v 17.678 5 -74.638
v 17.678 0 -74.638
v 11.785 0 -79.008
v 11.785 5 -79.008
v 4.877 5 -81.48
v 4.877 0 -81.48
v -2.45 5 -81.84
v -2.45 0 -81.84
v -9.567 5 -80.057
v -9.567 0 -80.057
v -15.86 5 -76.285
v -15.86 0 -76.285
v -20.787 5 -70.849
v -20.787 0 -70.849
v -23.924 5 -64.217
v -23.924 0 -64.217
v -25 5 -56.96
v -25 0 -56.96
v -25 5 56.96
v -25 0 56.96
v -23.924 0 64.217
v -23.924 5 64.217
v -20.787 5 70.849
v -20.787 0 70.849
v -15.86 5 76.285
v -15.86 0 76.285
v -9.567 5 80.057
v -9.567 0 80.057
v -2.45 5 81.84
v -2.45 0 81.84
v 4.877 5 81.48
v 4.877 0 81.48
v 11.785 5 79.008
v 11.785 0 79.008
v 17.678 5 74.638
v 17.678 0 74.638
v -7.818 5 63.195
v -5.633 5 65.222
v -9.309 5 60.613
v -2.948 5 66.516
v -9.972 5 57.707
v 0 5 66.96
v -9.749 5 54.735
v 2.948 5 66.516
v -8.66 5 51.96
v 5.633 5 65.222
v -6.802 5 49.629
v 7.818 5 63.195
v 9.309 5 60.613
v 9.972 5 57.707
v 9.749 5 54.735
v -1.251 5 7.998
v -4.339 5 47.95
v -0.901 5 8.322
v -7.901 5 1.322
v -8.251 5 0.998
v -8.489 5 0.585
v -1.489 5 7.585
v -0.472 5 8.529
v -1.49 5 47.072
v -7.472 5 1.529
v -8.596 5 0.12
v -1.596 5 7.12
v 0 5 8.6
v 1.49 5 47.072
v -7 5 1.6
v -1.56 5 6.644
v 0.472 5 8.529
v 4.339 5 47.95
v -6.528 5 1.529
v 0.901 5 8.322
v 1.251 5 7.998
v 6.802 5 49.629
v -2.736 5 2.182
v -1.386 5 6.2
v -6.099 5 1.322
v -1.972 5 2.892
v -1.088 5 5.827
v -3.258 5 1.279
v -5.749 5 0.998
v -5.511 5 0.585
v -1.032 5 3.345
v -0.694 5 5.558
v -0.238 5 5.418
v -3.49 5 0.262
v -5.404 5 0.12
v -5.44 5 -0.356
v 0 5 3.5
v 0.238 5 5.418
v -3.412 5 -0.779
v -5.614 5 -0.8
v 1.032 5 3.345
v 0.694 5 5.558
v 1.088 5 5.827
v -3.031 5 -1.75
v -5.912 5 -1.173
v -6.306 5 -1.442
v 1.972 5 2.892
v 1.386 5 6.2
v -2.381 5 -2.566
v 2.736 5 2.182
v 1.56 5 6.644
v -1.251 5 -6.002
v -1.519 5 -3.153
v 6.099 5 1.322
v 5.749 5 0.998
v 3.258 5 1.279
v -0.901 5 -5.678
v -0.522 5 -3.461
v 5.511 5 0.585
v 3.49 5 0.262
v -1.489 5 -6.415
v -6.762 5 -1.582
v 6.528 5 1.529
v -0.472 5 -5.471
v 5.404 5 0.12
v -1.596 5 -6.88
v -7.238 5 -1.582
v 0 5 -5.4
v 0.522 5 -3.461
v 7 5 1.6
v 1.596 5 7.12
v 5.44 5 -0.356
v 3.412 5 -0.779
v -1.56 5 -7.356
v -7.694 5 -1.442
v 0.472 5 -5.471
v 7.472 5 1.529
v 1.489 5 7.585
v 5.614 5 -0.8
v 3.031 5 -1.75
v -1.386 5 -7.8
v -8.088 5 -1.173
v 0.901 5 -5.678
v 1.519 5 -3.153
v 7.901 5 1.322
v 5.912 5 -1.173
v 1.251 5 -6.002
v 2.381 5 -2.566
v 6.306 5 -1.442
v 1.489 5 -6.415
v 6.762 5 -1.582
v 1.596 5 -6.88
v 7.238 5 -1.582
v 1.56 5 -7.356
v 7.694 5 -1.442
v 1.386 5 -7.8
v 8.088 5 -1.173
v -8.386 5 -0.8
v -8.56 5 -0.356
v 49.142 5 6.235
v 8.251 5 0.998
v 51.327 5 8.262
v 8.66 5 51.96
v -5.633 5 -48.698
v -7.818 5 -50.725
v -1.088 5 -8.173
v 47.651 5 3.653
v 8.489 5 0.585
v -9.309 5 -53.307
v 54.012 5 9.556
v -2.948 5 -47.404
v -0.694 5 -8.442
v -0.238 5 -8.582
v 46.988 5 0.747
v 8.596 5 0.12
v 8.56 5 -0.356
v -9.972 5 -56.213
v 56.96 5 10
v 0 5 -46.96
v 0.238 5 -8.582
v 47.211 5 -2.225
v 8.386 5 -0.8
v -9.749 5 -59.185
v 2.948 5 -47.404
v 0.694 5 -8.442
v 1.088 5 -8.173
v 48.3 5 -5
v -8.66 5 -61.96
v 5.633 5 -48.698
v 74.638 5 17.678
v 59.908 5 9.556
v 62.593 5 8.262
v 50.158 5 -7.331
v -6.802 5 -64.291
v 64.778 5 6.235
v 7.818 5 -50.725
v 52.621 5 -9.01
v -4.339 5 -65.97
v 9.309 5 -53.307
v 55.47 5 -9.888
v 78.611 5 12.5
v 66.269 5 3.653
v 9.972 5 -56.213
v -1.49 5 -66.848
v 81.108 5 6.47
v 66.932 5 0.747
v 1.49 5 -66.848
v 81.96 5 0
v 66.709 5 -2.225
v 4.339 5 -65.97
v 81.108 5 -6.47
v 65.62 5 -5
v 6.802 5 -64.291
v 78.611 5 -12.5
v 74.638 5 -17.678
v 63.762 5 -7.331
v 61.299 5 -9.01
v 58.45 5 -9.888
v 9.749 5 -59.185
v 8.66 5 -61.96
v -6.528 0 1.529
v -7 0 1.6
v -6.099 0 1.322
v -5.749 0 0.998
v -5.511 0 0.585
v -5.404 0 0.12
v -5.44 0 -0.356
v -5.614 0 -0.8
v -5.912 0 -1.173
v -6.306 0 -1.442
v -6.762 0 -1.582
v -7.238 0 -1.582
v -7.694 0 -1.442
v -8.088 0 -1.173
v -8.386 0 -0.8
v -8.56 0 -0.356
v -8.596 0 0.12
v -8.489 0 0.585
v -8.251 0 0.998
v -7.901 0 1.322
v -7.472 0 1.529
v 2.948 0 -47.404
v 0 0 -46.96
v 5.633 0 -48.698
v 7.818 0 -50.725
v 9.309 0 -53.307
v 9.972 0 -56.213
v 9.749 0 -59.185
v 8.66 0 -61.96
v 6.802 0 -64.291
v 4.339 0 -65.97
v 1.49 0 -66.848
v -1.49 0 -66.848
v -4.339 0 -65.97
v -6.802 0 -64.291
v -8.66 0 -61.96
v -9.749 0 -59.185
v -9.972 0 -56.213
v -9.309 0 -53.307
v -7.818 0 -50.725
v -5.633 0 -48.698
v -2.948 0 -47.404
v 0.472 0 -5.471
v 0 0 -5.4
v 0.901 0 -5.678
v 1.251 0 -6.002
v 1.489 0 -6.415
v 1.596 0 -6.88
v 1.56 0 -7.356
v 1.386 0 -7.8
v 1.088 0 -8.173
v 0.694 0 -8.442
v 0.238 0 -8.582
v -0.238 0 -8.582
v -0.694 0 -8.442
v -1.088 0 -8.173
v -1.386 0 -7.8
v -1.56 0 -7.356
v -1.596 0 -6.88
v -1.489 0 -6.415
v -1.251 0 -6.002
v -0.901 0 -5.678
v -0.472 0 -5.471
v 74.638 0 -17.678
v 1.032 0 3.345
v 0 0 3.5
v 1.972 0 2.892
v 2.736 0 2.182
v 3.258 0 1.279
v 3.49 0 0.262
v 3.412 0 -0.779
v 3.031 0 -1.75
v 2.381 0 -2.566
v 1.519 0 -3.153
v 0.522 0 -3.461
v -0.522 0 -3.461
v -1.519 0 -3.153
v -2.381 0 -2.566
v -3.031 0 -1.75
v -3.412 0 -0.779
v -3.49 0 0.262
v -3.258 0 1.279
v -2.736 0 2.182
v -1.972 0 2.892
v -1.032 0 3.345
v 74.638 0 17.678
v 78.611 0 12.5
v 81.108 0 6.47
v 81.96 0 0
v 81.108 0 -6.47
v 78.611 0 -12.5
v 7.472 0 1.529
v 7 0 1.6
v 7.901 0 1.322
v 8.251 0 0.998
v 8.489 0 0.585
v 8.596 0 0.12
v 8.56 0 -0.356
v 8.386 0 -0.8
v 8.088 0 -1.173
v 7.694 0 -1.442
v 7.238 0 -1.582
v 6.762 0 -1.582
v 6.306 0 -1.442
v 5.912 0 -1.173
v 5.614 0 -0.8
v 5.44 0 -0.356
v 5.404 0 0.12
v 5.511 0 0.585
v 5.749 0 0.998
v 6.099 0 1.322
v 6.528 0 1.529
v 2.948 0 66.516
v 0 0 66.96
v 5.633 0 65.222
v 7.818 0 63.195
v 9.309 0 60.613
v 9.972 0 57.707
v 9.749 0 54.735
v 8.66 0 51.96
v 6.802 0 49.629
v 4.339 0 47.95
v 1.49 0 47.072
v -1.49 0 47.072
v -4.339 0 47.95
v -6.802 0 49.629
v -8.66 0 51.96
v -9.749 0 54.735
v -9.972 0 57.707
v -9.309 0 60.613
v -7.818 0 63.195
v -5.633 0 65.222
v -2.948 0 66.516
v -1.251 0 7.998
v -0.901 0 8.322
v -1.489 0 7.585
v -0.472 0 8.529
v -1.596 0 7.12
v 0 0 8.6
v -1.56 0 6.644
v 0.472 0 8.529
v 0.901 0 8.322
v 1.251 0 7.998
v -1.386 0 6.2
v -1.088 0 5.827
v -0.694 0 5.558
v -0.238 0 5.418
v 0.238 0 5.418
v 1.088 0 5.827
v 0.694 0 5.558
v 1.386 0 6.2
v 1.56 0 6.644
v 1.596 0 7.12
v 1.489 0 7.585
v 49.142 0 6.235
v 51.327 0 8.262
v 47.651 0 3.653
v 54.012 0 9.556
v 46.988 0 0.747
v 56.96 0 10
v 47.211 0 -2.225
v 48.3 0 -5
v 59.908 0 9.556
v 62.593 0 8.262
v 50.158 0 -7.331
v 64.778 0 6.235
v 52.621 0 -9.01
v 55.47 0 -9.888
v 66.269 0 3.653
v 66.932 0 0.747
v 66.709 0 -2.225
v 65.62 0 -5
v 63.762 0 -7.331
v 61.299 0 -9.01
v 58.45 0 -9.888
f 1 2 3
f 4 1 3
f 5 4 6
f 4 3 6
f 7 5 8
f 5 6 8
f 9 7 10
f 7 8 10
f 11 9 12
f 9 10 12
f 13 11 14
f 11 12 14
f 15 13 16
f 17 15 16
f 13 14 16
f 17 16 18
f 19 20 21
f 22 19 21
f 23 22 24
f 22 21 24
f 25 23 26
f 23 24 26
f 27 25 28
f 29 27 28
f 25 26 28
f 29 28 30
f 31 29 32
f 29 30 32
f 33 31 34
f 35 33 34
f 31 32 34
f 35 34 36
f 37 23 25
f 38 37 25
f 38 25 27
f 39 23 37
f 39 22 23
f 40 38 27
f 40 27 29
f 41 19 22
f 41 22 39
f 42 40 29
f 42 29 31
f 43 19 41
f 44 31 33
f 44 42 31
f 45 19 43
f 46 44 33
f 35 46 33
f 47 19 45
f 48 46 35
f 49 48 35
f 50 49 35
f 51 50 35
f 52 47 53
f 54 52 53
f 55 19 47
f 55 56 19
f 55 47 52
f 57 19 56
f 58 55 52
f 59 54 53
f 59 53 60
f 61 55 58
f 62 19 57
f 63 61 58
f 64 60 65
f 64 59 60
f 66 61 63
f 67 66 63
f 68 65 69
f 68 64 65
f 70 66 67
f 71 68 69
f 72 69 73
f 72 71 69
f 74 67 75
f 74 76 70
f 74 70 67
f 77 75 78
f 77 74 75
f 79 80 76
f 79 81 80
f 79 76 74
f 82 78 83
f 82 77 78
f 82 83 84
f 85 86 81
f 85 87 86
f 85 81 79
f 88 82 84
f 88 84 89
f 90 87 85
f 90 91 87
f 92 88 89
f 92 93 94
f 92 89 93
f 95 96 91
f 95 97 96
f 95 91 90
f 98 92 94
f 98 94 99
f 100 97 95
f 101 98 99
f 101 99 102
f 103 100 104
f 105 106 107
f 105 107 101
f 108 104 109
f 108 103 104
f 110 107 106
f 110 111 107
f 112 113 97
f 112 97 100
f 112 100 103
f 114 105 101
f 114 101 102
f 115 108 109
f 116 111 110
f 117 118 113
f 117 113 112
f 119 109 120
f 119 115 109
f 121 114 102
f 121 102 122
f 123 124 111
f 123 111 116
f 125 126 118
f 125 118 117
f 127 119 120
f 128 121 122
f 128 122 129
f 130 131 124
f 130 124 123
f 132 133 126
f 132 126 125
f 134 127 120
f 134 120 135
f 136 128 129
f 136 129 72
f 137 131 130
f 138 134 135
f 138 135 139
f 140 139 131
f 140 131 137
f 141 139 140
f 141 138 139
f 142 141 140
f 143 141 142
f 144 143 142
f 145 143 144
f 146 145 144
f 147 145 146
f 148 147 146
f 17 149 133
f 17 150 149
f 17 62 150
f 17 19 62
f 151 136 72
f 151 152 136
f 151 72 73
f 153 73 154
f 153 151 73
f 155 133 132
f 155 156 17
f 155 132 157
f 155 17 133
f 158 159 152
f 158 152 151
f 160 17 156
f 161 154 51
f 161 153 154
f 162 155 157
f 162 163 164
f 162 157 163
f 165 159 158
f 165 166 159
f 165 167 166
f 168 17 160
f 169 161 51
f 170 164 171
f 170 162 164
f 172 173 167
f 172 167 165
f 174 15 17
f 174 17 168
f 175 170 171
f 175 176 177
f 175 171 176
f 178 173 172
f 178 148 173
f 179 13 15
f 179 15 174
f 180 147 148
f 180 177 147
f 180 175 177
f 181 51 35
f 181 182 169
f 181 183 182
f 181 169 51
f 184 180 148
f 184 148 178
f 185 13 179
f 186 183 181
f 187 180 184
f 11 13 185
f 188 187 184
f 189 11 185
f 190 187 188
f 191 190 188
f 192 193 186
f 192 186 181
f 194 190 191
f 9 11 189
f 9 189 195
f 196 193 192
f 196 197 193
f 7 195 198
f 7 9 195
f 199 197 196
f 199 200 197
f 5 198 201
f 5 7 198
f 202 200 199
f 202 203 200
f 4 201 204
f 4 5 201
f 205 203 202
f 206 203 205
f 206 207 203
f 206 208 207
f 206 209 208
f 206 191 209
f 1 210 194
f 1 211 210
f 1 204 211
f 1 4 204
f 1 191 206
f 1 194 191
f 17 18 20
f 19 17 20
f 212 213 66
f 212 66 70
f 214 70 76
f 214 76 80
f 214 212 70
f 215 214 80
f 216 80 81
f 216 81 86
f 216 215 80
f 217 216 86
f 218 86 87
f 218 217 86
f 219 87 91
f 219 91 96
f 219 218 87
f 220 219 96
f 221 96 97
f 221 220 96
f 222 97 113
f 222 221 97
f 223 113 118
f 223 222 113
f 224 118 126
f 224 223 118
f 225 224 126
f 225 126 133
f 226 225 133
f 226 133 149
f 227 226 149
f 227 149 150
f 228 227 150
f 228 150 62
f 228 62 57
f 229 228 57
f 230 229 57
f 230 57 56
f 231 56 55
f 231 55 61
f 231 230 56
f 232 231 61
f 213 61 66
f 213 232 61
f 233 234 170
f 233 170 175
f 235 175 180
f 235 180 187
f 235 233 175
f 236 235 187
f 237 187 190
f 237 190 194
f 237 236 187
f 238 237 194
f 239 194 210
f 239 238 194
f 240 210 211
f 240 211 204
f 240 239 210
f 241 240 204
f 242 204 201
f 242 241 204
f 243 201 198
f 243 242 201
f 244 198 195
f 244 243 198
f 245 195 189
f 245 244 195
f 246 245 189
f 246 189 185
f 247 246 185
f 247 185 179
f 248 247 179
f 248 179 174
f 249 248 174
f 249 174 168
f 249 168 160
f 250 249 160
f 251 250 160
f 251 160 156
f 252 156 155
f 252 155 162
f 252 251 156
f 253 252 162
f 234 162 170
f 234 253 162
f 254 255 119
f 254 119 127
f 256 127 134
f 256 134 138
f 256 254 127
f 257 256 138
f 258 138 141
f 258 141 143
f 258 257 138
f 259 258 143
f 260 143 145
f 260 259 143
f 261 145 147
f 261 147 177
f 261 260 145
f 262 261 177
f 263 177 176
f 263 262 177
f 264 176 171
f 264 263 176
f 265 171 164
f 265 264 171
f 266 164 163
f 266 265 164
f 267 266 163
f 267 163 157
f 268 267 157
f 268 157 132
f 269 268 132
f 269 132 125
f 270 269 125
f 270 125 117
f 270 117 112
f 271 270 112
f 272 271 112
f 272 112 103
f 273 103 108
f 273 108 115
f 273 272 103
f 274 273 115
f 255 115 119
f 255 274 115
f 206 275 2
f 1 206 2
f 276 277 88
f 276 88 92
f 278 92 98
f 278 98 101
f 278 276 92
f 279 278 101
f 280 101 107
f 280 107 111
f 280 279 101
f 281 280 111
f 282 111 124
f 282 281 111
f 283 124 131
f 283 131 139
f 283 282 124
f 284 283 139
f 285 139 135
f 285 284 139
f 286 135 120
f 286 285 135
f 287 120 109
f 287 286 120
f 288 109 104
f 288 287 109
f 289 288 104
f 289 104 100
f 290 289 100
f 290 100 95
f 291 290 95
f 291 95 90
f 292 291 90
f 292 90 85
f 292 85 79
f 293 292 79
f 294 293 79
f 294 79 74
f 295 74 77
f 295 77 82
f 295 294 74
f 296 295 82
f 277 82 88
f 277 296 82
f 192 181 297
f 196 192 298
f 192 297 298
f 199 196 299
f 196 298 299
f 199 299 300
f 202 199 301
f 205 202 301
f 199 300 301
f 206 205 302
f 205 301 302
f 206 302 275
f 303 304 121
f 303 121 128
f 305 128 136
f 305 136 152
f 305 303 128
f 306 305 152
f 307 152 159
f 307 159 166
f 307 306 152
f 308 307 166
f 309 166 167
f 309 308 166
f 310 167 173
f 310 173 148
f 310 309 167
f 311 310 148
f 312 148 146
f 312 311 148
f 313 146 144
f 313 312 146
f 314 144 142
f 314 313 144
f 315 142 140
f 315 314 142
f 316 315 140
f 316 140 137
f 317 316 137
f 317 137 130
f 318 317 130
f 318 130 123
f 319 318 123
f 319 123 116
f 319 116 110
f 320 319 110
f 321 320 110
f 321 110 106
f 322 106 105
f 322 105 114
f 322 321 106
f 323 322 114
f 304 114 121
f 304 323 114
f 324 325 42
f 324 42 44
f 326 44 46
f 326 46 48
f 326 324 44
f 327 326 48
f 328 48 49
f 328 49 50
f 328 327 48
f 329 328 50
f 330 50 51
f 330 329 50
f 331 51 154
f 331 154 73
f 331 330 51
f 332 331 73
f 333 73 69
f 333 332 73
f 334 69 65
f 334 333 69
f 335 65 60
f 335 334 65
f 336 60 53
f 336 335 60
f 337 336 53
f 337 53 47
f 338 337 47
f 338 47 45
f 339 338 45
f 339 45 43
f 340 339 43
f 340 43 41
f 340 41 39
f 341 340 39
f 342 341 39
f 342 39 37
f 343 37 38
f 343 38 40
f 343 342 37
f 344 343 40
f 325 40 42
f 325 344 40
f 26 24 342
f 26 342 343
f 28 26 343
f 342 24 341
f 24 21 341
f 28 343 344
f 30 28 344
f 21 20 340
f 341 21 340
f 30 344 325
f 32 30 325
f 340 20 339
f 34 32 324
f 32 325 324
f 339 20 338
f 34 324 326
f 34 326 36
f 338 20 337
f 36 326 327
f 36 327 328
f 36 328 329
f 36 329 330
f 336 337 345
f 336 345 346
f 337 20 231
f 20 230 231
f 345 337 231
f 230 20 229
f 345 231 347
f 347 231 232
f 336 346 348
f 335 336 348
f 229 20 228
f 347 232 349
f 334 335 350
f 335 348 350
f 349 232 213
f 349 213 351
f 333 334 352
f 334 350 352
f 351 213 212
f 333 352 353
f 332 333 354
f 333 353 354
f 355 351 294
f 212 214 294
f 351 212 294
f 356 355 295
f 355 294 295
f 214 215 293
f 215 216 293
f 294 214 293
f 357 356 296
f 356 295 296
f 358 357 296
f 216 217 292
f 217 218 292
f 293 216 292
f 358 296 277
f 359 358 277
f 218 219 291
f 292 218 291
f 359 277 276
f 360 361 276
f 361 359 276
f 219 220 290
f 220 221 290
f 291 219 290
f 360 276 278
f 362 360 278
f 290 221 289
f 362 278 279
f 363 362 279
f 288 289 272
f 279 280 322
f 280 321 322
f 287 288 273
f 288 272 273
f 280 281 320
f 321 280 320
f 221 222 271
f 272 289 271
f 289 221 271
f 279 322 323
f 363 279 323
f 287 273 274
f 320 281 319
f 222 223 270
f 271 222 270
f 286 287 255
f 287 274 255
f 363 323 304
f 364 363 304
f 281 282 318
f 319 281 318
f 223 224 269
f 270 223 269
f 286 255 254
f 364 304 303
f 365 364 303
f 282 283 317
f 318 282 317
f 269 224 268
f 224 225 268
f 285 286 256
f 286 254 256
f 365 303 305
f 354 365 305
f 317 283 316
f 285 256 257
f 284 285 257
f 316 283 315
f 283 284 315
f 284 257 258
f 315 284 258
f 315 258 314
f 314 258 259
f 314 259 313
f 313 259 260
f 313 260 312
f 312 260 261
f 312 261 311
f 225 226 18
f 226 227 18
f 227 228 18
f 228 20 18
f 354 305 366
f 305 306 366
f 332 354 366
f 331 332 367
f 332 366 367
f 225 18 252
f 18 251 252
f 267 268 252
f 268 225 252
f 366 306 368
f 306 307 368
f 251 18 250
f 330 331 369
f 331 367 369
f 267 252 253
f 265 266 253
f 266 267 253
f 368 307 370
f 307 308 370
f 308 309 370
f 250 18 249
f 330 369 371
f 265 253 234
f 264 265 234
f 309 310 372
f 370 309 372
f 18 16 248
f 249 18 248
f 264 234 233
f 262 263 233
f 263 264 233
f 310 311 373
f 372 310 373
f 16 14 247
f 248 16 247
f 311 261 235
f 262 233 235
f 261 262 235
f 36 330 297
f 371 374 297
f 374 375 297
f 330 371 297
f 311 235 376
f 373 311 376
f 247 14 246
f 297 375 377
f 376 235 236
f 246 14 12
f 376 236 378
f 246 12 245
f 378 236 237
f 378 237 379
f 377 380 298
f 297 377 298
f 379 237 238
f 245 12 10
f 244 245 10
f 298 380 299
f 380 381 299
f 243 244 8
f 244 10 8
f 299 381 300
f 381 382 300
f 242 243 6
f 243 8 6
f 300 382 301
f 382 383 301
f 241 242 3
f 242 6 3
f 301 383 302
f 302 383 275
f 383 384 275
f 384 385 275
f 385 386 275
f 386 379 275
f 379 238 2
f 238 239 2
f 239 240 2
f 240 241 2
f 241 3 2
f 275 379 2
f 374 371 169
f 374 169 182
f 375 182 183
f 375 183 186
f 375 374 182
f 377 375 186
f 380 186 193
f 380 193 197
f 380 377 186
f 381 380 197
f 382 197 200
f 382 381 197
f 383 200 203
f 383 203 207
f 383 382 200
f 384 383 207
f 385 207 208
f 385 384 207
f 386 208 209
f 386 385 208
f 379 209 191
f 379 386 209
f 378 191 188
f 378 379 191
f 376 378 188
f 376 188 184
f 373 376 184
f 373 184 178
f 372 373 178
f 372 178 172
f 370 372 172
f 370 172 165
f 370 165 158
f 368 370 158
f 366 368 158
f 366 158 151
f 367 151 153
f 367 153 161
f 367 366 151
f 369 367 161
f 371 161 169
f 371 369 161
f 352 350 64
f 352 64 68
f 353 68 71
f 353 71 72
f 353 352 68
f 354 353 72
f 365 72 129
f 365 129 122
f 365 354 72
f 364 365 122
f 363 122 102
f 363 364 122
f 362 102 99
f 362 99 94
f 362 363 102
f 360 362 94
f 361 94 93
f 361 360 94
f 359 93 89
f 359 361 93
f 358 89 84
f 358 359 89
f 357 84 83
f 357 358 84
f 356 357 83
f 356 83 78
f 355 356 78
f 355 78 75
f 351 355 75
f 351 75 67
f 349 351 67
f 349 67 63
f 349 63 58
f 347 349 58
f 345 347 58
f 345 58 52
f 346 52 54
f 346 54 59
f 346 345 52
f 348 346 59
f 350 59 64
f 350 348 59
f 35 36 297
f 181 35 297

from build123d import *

# Parameters (mm, degrees)
SKETCH_1_R      = 1.6
SKETCH_1_R_2    = 3.5
SKETCH_1_R_3    = 25
SKETCH_1_R_4    = 10
EXTRUDE_1_DEPTH = 5


with BuildPart() as part:
    # 草图1 → 凸台-拉伸1 (new body)
    # profile 1 of 4: a face of its own
    with BuildSketch(Plane(origin=(0, 0, 0), x_dir=(1, 0, 0), z_dir=(0, 1, 0))):
        with BuildLine():
            ThreePointArc((25, 56.96), (0, 31.96), (-25, 56.96))
            Line((-25, 56.96), (-25, -56.96))
            ThreePointArc((-25, -56.96), (0, -31.96), (25, -56.96))
            ThreePointArc((25, -56.96), (23.096988313, -66.527085809), (17.67766953, -74.63766953))
            Line((17.67766953, -74.63766953), (74.63766953, -17.67766953))
            ThreePointArc((74.63766953, -17.67766953), (31.96, 0), (74.63766953, 17.67766953))
            Line((74.63766953, 17.67766953), (17.67766953, 74.63766953))
            ThreePointArc((17.67766953, 74.63766953), (23.096988313, 66.527085809), (25, 56.96))
        make_face()
        with Locations(Location((0, -7, 0), (0, 0, 270))):
            Circle(SKETCH_1_R, mode=Mode.SUBTRACT)
        with Locations(Location((-7, 0, 0), (0, 0, 270))):
            Circle(SKETCH_1_R, mode=Mode.SUBTRACT)
        with Locations(Location((0, 0, 0), (0, 0, 270))):
            Circle(SKETCH_1_R_2, mode=Mode.SUBTRACT)
        with Locations(Location((0, 7, 0), (0, 0, 270))):
            Circle(SKETCH_1_R, mode=Mode.SUBTRACT)
        with Locations(Location((7, 0, 0), (0, 0, 270))):
            Circle(SKETCH_1_R, mode=Mode.SUBTRACT)
    # profile 2 of 4: a face of its own
    with BuildSketch(Plane(origin=(0, 0, 0), x_dir=(1, 0, 0), z_dir=(0, 1, 0))):
        with Locations((0, -56.96)):
            Circle(SKETCH_1_R_3)
        with Locations(Location((0, -56.96, 0), (0, 0, 270))):
            Circle(SKETCH_1_R_4, mode=Mode.SUBTRACT)
    # profile 3 of 4: a face of its own
    with BuildSketch(Plane(origin=(0, 0, 0), x_dir=(1, 0, 0), z_dir=(0, 1, 0))):
        with Locations((56.96, 0)):
            Circle(SKETCH_1_R_3)
        with Locations(Location((56.96, 0, 0), (0, 0, 270))):
            Circle(SKETCH_1_R_4, mode=Mode.SUBTRACT)
    # profile 4 of 4: a face of its own
    with BuildSketch(Plane(origin=(0, 0, 0), x_dir=(1, 0, 0), z_dir=(0, 1, 0))):
        with Locations((0, 56.96)):
            Circle(SKETCH_1_R_3)
        with Locations(Location((0, 56.96, 0), (0, 0, 270))):
            Circle(SKETCH_1_R_4, mode=Mode.SUBTRACT)
    extrude(amount=EXTRUDE_1_DEPTH)


solid = part.part
